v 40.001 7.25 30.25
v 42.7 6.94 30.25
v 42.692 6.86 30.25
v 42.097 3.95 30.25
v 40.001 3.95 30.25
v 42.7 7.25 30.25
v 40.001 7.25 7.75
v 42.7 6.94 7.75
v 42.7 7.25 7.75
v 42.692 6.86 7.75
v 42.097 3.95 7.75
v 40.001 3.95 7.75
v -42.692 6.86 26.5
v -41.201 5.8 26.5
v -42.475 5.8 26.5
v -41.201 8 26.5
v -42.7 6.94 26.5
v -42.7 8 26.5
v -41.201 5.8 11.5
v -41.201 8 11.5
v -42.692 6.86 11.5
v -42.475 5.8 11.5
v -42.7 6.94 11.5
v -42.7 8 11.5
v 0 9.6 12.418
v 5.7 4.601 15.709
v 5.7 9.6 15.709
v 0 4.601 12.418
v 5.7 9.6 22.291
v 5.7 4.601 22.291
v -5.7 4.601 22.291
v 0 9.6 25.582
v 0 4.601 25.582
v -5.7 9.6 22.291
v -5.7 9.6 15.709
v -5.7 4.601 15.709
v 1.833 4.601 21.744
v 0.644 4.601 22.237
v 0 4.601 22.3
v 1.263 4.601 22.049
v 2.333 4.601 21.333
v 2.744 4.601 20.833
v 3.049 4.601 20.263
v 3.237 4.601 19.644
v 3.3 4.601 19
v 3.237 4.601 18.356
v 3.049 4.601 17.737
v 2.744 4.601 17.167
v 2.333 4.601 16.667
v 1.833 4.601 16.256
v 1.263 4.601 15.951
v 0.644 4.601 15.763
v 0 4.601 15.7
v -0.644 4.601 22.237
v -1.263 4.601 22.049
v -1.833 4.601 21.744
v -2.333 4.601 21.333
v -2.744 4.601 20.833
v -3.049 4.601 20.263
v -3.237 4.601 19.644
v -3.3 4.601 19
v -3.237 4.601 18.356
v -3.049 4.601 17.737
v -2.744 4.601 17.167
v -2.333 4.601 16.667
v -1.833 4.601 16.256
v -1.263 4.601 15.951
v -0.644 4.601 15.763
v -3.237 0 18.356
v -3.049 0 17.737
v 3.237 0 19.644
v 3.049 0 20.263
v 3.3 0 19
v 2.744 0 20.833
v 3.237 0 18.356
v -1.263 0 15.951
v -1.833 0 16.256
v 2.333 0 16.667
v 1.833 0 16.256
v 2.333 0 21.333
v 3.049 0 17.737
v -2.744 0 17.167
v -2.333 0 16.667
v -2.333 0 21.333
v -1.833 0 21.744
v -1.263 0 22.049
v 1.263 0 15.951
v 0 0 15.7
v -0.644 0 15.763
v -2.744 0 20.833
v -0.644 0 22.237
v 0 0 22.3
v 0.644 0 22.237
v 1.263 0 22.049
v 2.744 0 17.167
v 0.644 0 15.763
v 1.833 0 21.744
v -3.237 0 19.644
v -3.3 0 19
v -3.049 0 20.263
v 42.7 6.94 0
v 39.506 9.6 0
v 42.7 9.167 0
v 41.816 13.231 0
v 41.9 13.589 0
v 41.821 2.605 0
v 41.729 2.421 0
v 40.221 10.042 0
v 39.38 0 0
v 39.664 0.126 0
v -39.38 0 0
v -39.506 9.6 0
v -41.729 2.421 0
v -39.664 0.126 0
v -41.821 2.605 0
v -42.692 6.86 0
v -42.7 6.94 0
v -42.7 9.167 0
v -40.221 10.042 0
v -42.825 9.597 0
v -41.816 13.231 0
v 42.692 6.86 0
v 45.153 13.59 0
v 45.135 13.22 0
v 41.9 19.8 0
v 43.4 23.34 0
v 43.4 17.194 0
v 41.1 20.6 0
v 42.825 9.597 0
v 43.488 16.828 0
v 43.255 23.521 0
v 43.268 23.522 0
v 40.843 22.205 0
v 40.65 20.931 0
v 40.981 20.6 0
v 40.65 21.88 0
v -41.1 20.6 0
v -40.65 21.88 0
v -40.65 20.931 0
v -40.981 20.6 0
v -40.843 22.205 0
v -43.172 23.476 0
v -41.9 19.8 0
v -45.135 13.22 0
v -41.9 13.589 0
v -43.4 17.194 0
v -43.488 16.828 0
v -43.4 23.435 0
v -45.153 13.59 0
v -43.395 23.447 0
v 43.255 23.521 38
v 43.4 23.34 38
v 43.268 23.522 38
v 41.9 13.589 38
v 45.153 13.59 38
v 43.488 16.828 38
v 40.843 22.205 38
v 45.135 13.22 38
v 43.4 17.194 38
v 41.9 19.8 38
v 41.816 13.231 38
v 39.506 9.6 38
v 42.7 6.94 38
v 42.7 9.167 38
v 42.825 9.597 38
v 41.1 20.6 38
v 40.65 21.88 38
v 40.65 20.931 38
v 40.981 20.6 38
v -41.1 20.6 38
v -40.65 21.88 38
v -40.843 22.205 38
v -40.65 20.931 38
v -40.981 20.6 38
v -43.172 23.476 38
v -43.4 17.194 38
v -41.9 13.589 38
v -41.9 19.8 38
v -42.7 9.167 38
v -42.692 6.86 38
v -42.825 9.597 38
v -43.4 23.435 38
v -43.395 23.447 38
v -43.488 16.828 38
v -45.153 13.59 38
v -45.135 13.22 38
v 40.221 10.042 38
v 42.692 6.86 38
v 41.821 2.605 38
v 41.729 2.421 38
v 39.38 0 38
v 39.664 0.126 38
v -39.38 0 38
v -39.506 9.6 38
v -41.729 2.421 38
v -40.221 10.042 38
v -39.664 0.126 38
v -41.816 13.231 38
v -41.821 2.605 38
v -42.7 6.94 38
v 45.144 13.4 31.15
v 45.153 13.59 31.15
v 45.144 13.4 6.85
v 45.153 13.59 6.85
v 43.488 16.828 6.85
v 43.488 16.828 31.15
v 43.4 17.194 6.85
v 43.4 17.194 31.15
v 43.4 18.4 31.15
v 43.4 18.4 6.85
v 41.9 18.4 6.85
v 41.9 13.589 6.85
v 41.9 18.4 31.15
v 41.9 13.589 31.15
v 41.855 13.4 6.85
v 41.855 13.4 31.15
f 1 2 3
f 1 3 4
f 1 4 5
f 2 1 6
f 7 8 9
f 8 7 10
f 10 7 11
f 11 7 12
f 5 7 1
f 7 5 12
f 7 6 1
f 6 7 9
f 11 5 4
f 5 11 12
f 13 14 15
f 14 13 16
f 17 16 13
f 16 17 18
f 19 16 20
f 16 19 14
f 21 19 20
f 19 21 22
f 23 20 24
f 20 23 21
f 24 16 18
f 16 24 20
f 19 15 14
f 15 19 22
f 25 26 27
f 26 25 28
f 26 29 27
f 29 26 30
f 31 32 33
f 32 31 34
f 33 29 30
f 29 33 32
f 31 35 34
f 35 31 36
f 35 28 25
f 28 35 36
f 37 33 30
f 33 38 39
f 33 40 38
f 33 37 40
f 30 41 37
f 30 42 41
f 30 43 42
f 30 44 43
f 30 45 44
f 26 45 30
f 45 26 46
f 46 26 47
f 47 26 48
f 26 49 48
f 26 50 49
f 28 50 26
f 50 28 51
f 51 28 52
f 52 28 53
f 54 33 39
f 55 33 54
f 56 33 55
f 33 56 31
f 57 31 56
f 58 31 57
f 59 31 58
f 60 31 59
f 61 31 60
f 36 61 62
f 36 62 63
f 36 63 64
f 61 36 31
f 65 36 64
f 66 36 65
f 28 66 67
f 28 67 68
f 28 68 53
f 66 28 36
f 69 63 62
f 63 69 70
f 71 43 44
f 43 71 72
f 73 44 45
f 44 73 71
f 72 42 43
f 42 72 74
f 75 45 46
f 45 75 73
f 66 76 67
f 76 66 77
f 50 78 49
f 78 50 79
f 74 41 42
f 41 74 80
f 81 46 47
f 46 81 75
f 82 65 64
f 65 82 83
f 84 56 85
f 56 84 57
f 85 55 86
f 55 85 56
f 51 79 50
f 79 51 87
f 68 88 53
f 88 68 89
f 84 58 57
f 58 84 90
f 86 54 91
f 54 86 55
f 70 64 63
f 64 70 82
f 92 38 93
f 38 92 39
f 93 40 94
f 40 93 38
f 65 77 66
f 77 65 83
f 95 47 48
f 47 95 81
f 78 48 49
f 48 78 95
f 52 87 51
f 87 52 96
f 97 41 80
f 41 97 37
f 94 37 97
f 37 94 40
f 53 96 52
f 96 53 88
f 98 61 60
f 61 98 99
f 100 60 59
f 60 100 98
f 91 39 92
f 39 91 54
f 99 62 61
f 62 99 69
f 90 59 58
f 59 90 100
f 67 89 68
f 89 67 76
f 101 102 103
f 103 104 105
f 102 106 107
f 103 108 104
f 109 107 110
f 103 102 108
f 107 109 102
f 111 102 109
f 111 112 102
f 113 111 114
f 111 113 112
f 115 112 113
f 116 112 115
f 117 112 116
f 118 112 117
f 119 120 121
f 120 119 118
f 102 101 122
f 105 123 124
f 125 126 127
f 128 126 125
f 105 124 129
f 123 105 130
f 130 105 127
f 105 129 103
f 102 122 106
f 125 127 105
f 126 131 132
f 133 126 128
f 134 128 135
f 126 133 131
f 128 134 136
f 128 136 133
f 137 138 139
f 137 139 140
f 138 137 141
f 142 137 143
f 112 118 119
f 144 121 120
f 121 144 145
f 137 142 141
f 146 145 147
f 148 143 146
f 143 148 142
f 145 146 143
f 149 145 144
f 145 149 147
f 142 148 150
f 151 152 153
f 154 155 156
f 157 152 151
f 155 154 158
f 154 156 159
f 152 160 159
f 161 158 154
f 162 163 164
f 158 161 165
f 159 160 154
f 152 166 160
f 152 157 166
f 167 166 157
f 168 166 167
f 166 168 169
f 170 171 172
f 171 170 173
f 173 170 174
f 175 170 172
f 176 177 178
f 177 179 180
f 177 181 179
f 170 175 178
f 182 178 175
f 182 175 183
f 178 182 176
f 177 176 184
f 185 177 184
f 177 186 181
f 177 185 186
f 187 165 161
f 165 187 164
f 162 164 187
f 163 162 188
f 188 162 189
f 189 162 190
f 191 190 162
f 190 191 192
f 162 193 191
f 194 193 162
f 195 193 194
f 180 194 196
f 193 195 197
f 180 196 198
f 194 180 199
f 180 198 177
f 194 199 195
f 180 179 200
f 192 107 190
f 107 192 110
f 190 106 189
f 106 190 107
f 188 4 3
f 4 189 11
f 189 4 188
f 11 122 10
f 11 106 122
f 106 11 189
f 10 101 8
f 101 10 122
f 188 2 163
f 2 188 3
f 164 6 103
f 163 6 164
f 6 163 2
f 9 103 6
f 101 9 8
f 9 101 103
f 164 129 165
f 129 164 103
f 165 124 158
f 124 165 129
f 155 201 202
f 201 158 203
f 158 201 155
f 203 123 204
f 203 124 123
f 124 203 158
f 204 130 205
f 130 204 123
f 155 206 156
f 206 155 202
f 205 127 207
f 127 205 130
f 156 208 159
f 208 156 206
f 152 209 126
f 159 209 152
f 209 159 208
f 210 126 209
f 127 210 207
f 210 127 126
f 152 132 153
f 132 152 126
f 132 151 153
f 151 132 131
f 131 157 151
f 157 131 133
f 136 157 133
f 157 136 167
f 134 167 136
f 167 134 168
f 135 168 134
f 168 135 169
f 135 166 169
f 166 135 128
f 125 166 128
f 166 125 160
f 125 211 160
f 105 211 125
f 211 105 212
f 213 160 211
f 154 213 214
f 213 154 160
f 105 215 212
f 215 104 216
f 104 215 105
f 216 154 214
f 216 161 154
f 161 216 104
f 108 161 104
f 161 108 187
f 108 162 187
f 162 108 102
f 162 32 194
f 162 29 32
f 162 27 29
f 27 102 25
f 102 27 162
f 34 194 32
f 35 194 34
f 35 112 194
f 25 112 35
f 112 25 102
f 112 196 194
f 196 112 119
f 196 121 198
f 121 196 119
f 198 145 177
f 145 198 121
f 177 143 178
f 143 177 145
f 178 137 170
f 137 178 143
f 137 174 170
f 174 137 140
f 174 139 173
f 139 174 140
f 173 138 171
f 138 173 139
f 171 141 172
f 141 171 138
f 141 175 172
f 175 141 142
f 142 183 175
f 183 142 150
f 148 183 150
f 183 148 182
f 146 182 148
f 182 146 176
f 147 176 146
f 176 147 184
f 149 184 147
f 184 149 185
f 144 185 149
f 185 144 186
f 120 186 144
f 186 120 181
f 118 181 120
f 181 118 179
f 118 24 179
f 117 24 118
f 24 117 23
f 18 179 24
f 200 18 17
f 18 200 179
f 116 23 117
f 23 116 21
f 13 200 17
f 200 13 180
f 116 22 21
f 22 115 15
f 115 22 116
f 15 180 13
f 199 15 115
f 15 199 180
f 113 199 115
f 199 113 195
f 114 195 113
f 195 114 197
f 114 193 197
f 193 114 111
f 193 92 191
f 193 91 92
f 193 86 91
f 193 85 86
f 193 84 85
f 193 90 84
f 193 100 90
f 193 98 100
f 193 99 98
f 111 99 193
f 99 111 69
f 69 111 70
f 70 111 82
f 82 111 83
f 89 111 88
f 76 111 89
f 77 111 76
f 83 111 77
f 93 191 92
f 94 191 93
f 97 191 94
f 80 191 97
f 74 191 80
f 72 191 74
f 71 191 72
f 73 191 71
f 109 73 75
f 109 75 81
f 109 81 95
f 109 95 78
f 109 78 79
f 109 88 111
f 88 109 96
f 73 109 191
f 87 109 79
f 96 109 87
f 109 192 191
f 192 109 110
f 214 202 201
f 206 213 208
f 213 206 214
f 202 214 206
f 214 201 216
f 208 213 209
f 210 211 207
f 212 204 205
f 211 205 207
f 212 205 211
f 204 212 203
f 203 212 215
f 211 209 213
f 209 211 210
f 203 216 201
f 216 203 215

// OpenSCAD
// file: paths.scad
function sumTo(v,n) = n<=0 ? 0 : v[n-1]+sumTo(v,n-1);
function sum(v) = sumTo(v,len(v));
function interpolationData(v) = let(
    n=len(v)-1,
    d=[for (i=[0:n-1]) norm(v[i]-v[i+1])],
    sumD=[for (i=[0:n]) sumTo(d,i)],
    totalD=sumD[n]) 
        [d,sumD,v,totalD];
function totalLength(interp) = interp[3];
function interpolatePoints(a,b,t) = (1-t)*a+(t)*b;
function findSegmentByDistance(sumD,distance) = let(
    found = [for(i=[0:len(sumD)-1]) if(sumD[i]<=distance && distance<sumD[i+1]) i])
        len(found)>0 ? found[0] : -1;
function interpolateByDistance(interp,distance) = let(
    n=len(interp[1])-1,
    d=interp[0],
    sumD=interp[1],
    v=interp[2],
    totalD=interp[3],
    i=findSegmentByDistance(sumD,distance))
        i<0 ? (distance<totalD/2 ? v[0] : v[n]) :
            interpolatePoints(v[i],v[i+1],(distance-sumD[i])/d[i]);
function get2DNormalBetweenPoints(a,b) = let(
    v = (b-a)/norm(b-a))
        [v[1],-v[0]];
    
function getTangentByDistance(interp,distance) = let(
    n=len(interp[1])-1,
    d=interp[0],
    sumD=interp[1],
    v=interp[2],
    totalD=interp[3],
    i0=findSegmentByDistance(sumD,distance),
    i = i0 < 0 ? (distance<totalD/2 ? 0 : n-1) : i0)
        (v[i+1]-v[i])/norm(v[i+1]-v[i]);
    
function interpolateByParameter(interp,t) = interpolateByDistance(interp,t*totalLength(interp));
function singleInterpolateByDistance(v,distance) = interpolateByDistance(interpolationData(v),distance);
function singleInterpolateByParameter(v,t) = interpolateByParameter(interpolationData(v),t);
function measurePath(v) = totalLength(interpolationData(v));

function findCoordinateIntersection2(a,b,index,value) = 
    a[index] == value ? a : 
        b[index] == value ? b :
            let( t=(value-a[index]) / (b[index]-a[index]))
                (1-t)*a+t*b;

function findCoordinateIntersections(path,index,value) = 
    [for (i=[0:len(path)-2]) if ((path[i][index]-value)*(path[i+1][index]-value) <= 0) findCoordinateIntersection2(path[i],path[i+1],index,value)];            

function mirrorMatrix(normalVector) = let(v = normalVector/norm(normalVector)) len(v)<3 ? [[1-2*v[0]*v[0],-2*v[0]*v[1]],[-2*v[0]*v[1],1-2*v[1]*v[1]]] : [[1-2*v[0]*v[0],-2*v[0]*v[1],-2*v[0]*v[2]],[-2*v[0]*v[1],1-2*v[1]*v[1],-2*v[1]*v[2]],[-2*v[0]*v[2],-2*v[1]*v[2],1-2*v[2]*v[2]]];

function trimArray(a, n) = [for (i=[0:n-1]) a[i]];

function transformPoint(matrix,a) = 
    let(n=len(a))
        len(matrix[0])==n+1 ? 
            trimArray(matrix * concat(a,[1]), n)
            : matrix * a;

function transformPath(matrix,path) =
    [for (a=path) transformPoint(matrix,a)];

function reverseArray(array) = let(n=len(array)) [for (i=[0:n-1]) array[n-1-i]];

function stitchPaths(a,b) = let(na=len(a)) [for (i=[0:na+len(b)-2]) i<na? a[i] : b[i-na+1]-b[0]+a[na-1]];

//interp = interpolationData([[1,2],[2,3],[1,2]]);
//echo(singleInterpolateByParameter([[1,1],[2,2],[3,1]],0.75));
//echo(measurePath([[1,2],[2,3],[1,2]]));

function _removeDuplicates(v, closed=false, out=[], pos=0) =
    pos >= len(v) ? out :
    (pos==0 && closed && v[0] == v[len(v)-1]) || (pos>0 && v[pos] == v[pos-1]) ? _removeDuplicates(v, closed=closed, out=out, pos=pos+1) : _removeDuplicates(v, closed=closed, out=concat(out, [v[pos]]), pos=pos+1);

function _normalizeVectorSafe(v) = let(l=norm(v)) l==0?v:v/norm(v);

function _insetVertex(path,distance,closed,pos) = 
    let( npos = (pos+1)%len(path),
         ppos = (pos+len(path)-1)%len(path),
         next = closed || pos+1 < len(path) ? path[npos]-path[pos] : path[pos]-path[ppos],
         prev = closed || 0<pos ? path[pos]-path[ppos] : path[npos]-path[pos],
         avg = _normalizeVectorSafe(prev)+_normalizeVectorSafe(next),
        turned = _normalizeVectorSafe([-avg[1],avg[0]]) )
        path[pos] + turned * distance;

function _insetPath(path=[],distance=2, closed=true, out=[], pos=0) =
    pos >= len(path) ? out :
    _insetPath(path=path,distance=distance,closed=closed,out=concat(out,[_insetVertex(path,distance,closed,pos)]),pos=pos+1);    

function insetPath(path=[], distance=2, closed=true) =
    let(path=_removeDuplicates(path, closed=true))
    _insetPath(path=path,distance=distance,closed=closed);
    
module tracePath(path=[], closed=true) {
    for (i=[0:len(path)-(closed?1:2)])
        hull() {
            translate(path[i]) children();
            translate(path[(i+1)%len(path)]) children();            
        }
}    
    
//<skip>
n = 10;
demo = [for(i=[0:n-1]) 10*[cos(360*i/n),sin(360*i/n)]];
difference() 
{
    polygon(insetPath(demo,distance=-2));
    polygon(insetPath(demo,distance=2));
}    
//</skip>
// main file
use <paths.scad>;

//<params>
holderHeight = 38;

// If you have a Garmin Nuvi holder and want this to fit inside it, set this to true. Otherwise, set it to false and everything will look a bit better
fitIntoNuviHolder = 1; //[0:No, 1:Yes]
// If phoneWidth is above 85, it won't work well with the Nuvi holder mode
phoneWidth = 83.8; 
// This is a little bit less than the thickness of the phone, to take into account phone/case rounding
phoneThickness = 11;

// This has to be sufficiently thick to accommodate the Nuvi holder slits (if desired) and the hex bolt head (if desired). With all the current parameters, it is not recommended to make this less than 7
baseThickness = 13.4;

// set to zero if we don't need a slot on the right right side for buttons to fit inside
buttonSlotLength = 24.3;
buttonSlotThickness = 5;

// The phone is rounded, and hence narrower near the back
narrowerWidthInset = 3.8;
narrowingAmount = 1.9;

// This controls how far the nubs that keep the phone from falling out go
snapInset = 1.25;
// If this is larger, the snap is more durable, but harder to use
snapThickness = 1.5;
// If snapThickness is small, this should give some extra strength
strengtheningBumpOffset = 3.35;

// Round all the sharp edges
rounding = 0.8;

// set to zero to remove bolt hole
hexBoltDistanceAcrossFlats = 11.4;
// depth of bolt head inset (a little bigger than the bolt head thickness)
hexBoltDepthOfHeadInset = 5;
// shaft diameter
hexBoltShaftDiameter = 6.6;

// The following parameters are for fitting into my Nuvi GPS holder
Nuvi_b1 = 79.1;
Nuvi_b1a = 83.6;
Nuvi_b2 = 85.4;
Nuvi_h1a = 2.5;
Nuvi_hDelta = 4;
Nuvi_rightNubFromBase = 5.6;
Nuvi_rightNubSlitThickness = 3.3;
Nuvi_rightNubSlitLength = 22.5;;
Nuvi_rightNubSlitDepth = 2.7;
Nuvi_leftNubFromBase = 6.9;
Nuvi_leftNubSlitThickness = 2.2;
Nuvi_leftNubSlitLength = 15;
Nuvi_leftNubSlitDepth = 1.5;

// No-Nuvi parameters
b1_inset = 2.35;
b1a_inset = 0.1;
b2_offset = 0.8;

// These are if you want a thingy for putting into a CD player or the like.
slotThickness = 0*1.5;
slotDepth = 50;
slotWidth = 50;
slotChamfer = 3.5;
//</params>

module dummy() {}

b1 = fitIntoNuviHolder != 0 ? Nuvi_b1 : phoneWidth - 2 * b1_inset;
b1a = fitIntoNuviHolder != 0 ? Nuvi_b1a : phoneWidth - 2 * b1a_inset;
b2 = fitIntoNuviHolder != 0 ? Nuvi_b2 : phoneWidth + 2 * b2_offset;
h1a = Nuvi_h1a;
hDelta = Nuvi_hDelta;
rightNubFromBase = Nuvi_rightNubFromBase;
rightNubSlitThickness = Nuvi_rightNubSlitThickness;
rightNubSlitLength = Nuvi_rightNubSlitLength;
rightNubSlitDepth = Nuvi_rightNubSlitDepth;
leftNubFromBase = Nuvi_leftNubFromBase;
leftNubSlitThickness = Nuvi_leftNubSlitThickness;
leftNubSlitLength = Nuvi_leftNubSlitLength;
leftNubSlitDepth = Nuvi_leftNubSlitDepth;

b3 = phoneWidth + 2 * strengtheningBumpOffset;
narrowerWidth = phoneWidth - 2 * narrowingAmount;

phoneThicknessAdj = phoneThickness - narrowerWidthInset;
nubsFromBase = max(rightNubFromBase,leftNubFromBase);
fromNubsToPhone = baseThickness - nubsFromBase;

nudge = 0.001;

rightPath = 
  [ [b1/2,0],
    [b1a/2,h1a],
    [b2/2,nubsFromBase],
    [b2/2,baseThickness-hDelta],
    [b3/2,baseThickness],
    [phoneWidth/2+snapThickness,baseThickness+phoneThicknessAdj*0.5],
    [phoneWidth/2+snapThickness,baseThickness+phoneThicknessAdj+snapThickness+1.5],
    [phoneWidth/2-snapInset,baseThickness+phoneThicknessAdj+snapThickness],
    [phoneWidth/2-snapInset,baseThickness+phoneThicknessAdj],
    [phoneWidth/2,baseThickness+phoneThicknessAdj],
    [phoneWidth/2,baseThickness],
    [narrowerWidth/2,baseThickness-narrowerWidthInset],
    [0, baseThickness-narrowerWidthInset]
];
    
    
path = stitchPaths(rightPath,reverseArray(transformPath(mirrorMatrix([1,0]),rightPath)));

module mainHolder() {
    linear_extrude(height=holderHeight) 
offset(r=-rounding) offset(r=rounding) polygon(points=path);
}

module slit(nubFromBase,nubSlitThickness,nubSlitLength,nubSlitDepth) {
    translate([b2/2+nudge-nubSlitDepth,nubFromBase-nubSlitThickness/2,holderHeight/2-nubSlitLength/2])
    cube([nubSlitDepth+nudge+10,nubSlitThickness,nubSlitLength]);
}

module hexHole() {
    translate([0,baseThickness-narrowerWidthInset+nudge,holderHeight/2])
    rotate([90,0,0]) {
        rotate([0,0,30])
        cylinder(d=hexBoltDistanceAcrossFlats/cos(180/6),h=hexBoltDepthOfHeadInset,$fn=6);
        cylinder(d=hexBoltShaftDiameter,h=50,$fn=32);
    }
}

render(convexity=2)
difference() {
    mainHolder();
    if (fitIntoNuviHolder != 0) {
        slit(rightNubFromBase,rightNubSlitThickness,rightNubSlitLength,rightNubSlitDepth);
        mirror([1,0,0]) slit(leftNubFromBase,leftNubSlitThickness,leftNubSlitLength,leftNubSlitDepth);
    }
    if (buttonSlotLength) {
        translate([b1/2,baseThickness,(holderHeight-buttonSlotLength)/2]) cube([15,buttonSlotThickness,buttonSlotLength]);
    }
    if (hexBoltDistanceAcrossFlats) {
        hexHole();
    }
}

if (slotThickness && slotDepth && slotWidth) {
    intersection() {
        union() {
            scale([1,2*slotDepth/slotWidth,1]) cylinder(d=slotWidth,h=slotThickness,$fn=128);
            translate([0,0,slotThickness])
            rotate([90,0,90]) cylinder(r=slotChamfer,$fn=4,center=true,h=slotWidth);
        }
        translate([-500,-1000+nudge,0]) cube([1000,1000,1000]);
    }
    
}
